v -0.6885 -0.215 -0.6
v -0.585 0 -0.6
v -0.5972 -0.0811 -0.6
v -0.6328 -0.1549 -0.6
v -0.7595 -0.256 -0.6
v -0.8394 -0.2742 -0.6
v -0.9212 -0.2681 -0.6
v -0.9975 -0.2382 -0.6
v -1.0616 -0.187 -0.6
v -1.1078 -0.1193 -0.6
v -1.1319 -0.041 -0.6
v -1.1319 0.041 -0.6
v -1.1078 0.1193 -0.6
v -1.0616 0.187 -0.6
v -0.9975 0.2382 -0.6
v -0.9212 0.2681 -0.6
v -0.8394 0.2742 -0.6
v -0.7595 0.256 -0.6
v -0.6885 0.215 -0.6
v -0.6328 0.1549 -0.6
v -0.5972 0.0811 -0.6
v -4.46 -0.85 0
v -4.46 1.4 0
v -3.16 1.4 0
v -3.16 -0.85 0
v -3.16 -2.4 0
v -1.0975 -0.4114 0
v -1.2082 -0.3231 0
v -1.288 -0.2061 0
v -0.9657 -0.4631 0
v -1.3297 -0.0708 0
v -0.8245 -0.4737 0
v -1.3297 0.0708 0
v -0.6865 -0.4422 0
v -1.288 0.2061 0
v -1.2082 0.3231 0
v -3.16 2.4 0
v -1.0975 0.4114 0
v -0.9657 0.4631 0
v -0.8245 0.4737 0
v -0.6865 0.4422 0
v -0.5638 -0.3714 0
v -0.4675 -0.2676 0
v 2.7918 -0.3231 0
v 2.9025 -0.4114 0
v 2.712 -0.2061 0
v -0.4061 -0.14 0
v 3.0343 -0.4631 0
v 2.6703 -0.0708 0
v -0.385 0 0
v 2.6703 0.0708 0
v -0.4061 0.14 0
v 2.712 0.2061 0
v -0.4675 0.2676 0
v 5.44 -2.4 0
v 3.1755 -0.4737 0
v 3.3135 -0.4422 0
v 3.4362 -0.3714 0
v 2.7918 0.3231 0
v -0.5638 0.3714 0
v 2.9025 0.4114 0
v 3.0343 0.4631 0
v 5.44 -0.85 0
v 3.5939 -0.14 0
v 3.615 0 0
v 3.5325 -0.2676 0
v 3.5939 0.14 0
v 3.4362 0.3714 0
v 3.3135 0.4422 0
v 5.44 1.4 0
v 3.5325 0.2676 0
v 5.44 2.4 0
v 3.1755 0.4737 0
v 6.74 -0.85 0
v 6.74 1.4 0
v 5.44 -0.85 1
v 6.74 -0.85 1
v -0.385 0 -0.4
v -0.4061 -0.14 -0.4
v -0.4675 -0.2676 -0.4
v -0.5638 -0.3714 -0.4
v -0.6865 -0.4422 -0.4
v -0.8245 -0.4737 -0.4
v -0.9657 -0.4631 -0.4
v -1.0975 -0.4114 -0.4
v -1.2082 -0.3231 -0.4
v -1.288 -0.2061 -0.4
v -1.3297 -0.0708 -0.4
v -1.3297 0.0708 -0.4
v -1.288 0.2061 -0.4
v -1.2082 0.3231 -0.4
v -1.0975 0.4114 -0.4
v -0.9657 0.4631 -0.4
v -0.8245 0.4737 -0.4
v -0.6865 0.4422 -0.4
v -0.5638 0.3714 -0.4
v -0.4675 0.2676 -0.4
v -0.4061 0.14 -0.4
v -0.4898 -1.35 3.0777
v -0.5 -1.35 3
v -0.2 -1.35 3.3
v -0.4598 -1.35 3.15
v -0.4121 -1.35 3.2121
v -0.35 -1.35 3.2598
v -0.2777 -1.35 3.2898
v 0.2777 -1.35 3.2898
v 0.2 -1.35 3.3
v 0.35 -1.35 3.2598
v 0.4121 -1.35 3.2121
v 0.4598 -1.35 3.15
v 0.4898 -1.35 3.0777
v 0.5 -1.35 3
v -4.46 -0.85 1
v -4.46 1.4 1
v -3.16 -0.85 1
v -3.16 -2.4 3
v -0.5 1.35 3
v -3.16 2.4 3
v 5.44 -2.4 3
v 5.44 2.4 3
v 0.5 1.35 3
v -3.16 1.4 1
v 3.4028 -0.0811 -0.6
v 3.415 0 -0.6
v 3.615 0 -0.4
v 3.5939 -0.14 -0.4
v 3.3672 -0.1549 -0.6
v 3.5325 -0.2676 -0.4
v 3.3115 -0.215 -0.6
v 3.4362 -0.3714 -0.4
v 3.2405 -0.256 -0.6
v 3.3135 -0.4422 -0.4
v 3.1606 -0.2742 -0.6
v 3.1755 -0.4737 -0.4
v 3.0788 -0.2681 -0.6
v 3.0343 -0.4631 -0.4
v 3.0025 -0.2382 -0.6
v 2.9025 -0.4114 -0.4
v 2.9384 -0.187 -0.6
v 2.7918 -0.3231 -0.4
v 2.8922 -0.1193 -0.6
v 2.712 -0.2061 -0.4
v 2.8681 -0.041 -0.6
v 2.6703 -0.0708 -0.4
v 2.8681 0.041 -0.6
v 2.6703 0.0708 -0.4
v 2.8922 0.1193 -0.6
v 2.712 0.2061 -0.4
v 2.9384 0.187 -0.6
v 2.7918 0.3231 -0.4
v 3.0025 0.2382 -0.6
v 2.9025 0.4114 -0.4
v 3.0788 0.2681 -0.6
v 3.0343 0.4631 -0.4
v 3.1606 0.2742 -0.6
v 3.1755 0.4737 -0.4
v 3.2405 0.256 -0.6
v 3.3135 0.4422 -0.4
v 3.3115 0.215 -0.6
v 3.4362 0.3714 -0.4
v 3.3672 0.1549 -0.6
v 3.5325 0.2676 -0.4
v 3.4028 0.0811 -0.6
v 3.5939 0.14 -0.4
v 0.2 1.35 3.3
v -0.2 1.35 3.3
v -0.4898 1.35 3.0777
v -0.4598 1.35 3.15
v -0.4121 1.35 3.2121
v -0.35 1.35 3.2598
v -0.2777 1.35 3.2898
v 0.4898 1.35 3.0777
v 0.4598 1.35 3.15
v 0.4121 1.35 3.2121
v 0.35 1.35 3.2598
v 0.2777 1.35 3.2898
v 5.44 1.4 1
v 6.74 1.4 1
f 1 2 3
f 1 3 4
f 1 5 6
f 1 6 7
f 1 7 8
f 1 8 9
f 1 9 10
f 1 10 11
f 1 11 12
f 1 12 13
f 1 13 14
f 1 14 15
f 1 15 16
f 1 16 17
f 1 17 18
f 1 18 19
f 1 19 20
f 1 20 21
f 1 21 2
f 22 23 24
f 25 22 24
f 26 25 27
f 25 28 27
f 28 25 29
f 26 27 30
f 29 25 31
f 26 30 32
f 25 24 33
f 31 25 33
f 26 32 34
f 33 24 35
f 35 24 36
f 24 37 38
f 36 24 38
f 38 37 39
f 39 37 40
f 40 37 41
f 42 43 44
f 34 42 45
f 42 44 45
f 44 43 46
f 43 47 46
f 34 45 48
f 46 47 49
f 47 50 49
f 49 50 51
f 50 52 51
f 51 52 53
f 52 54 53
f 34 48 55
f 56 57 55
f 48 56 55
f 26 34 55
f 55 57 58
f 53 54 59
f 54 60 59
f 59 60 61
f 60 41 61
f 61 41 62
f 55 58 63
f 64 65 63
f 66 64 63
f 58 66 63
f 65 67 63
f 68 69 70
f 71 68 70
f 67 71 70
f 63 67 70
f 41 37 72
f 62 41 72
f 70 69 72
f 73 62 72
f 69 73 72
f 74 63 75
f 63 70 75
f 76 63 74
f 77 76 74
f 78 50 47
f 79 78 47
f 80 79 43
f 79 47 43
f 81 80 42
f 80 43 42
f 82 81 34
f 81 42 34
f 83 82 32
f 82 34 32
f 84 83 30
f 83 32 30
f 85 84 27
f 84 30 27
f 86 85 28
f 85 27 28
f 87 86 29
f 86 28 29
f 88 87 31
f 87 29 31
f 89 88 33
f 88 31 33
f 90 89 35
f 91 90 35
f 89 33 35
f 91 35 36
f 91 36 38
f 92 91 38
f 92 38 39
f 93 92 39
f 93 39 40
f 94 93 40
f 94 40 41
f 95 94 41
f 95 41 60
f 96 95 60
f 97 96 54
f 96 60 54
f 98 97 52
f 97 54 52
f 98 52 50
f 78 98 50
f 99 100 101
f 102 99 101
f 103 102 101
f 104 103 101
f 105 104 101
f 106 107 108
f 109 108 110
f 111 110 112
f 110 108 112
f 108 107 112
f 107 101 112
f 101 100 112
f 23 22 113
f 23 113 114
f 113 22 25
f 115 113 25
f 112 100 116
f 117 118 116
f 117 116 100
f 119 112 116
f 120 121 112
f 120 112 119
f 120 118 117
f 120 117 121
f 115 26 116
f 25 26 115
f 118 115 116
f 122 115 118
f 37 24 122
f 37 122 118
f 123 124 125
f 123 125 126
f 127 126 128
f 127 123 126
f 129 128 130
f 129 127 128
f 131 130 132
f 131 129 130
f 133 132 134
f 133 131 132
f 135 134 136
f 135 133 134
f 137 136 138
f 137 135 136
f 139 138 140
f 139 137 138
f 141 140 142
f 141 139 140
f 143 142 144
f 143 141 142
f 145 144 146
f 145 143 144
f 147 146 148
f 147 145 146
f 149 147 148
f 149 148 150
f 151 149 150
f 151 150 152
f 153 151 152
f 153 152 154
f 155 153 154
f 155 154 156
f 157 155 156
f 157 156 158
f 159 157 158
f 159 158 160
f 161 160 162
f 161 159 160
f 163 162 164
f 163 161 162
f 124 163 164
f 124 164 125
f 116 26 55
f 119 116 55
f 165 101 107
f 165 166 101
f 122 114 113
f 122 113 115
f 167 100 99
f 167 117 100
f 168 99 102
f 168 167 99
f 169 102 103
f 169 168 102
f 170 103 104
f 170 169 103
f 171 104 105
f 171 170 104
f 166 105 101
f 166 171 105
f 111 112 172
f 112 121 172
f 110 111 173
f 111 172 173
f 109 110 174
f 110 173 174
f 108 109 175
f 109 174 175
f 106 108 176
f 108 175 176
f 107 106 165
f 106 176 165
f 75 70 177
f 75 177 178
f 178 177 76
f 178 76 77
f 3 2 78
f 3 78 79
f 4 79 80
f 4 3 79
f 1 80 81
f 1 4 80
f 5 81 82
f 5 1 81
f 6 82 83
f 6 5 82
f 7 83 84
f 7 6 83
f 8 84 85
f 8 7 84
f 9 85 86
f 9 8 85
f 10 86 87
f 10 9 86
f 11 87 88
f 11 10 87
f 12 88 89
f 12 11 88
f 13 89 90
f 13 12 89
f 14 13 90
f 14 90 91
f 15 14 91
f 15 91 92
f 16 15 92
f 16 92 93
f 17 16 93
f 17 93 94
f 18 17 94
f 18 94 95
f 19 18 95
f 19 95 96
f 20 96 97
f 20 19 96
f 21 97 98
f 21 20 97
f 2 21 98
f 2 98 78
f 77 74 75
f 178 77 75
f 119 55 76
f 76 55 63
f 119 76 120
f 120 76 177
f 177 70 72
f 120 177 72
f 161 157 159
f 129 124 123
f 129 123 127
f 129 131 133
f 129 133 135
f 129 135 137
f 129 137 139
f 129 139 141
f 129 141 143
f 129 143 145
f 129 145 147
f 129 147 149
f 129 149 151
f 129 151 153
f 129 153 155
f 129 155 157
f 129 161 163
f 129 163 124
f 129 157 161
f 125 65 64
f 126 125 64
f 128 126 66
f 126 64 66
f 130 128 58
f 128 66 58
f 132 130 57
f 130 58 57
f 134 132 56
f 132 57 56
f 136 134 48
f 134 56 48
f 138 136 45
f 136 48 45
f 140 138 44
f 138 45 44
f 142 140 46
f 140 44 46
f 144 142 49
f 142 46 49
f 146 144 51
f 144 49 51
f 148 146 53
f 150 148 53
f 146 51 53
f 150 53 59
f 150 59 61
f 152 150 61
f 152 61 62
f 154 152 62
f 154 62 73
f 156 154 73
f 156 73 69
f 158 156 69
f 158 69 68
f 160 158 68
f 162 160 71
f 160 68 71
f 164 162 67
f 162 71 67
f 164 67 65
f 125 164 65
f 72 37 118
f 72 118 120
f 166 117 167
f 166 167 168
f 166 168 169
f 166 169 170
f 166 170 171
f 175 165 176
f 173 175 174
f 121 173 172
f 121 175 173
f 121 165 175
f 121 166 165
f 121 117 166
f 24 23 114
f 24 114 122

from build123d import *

# Parameters (mm, degrees)
F0_W     = 8.6
F0_H     = 4.8
F1_DEPTH = 3
F2_R     = 0.475
F3_DEPTH = 0.6
F4_SIZE  = 0.2
F5_W     = 1.3
F5_H     = 2.25
F6_DEPTH = 1
F7_W     = 1
F7_H     = 2.7
F8_DEPTH = 0.3
F9_R     = 0.29999


# Not quite as in the source:
# - a fillet or chamfer is up to 0.001 mm smaller than in the source, because OpenCascade refuses the exact size


with BuildPart() as f1:
    # F0 (on Top) → F1 (new body)
    with BuildSketch(Plane.XY):
        Rectangle(F0_W, F0_H)
    extrude(amount=F1_DEPTH)

    # F2 (on face) → F3 (join)
    with BuildSketch(Plane(origin=(0, 0, 0), x_dir=(1, 0, 0), z_dir=(0, 0, -1))):
        with Locations((-2, 0)):
            Circle(F2_R)
        with Locations((2, 0)):
            Circle(F2_R)
    extrude(amount=F3_DEPTH)

    # F4
    f4_edges = [f1.edges().sort_by_distance(p)[0] for p in [
        (-2.475, 0, -0.6),
        (1.525, 0, -0.6),
    ]]
    chamfer(f4_edges, length=F4_SIZE)

    # F5 (on Top) → F6 (join)
    with BuildSketch(Plane.XY):
        with Locations((-4.95, 0.275)):
            Rectangle(F5_W, F5_H)
        with Locations((4.95, 0.275)):
            Rectangle(F5_W, F5_H)
    extrude(amount=F6_DEPTH)

    # F7 (on face) → F8 (join)
    with BuildSketch(Plane.XY.offset(3)):
        with Locations((-1.14, 0)):
            Rectangle(F7_W, F7_H)
    extrude(amount=F8_DEPTH)

    # F9 (radius 0.3 in the source; OpenCascade refuses exactly that, so slightly less here)
    f9_edges = [f1.edges().sort_by_distance(p)[0] for p in [
        (-1.64, 0, 3.3),
        (-0.64, 0, 3.3),
    ]]
    fillet(f9_edges, radius=F9_R)


with BuildPart() as f1_1:
    # F10: moved
    add(f1.part.moved(Location((1.14, 0, 0))))


solid = f1_1.part
